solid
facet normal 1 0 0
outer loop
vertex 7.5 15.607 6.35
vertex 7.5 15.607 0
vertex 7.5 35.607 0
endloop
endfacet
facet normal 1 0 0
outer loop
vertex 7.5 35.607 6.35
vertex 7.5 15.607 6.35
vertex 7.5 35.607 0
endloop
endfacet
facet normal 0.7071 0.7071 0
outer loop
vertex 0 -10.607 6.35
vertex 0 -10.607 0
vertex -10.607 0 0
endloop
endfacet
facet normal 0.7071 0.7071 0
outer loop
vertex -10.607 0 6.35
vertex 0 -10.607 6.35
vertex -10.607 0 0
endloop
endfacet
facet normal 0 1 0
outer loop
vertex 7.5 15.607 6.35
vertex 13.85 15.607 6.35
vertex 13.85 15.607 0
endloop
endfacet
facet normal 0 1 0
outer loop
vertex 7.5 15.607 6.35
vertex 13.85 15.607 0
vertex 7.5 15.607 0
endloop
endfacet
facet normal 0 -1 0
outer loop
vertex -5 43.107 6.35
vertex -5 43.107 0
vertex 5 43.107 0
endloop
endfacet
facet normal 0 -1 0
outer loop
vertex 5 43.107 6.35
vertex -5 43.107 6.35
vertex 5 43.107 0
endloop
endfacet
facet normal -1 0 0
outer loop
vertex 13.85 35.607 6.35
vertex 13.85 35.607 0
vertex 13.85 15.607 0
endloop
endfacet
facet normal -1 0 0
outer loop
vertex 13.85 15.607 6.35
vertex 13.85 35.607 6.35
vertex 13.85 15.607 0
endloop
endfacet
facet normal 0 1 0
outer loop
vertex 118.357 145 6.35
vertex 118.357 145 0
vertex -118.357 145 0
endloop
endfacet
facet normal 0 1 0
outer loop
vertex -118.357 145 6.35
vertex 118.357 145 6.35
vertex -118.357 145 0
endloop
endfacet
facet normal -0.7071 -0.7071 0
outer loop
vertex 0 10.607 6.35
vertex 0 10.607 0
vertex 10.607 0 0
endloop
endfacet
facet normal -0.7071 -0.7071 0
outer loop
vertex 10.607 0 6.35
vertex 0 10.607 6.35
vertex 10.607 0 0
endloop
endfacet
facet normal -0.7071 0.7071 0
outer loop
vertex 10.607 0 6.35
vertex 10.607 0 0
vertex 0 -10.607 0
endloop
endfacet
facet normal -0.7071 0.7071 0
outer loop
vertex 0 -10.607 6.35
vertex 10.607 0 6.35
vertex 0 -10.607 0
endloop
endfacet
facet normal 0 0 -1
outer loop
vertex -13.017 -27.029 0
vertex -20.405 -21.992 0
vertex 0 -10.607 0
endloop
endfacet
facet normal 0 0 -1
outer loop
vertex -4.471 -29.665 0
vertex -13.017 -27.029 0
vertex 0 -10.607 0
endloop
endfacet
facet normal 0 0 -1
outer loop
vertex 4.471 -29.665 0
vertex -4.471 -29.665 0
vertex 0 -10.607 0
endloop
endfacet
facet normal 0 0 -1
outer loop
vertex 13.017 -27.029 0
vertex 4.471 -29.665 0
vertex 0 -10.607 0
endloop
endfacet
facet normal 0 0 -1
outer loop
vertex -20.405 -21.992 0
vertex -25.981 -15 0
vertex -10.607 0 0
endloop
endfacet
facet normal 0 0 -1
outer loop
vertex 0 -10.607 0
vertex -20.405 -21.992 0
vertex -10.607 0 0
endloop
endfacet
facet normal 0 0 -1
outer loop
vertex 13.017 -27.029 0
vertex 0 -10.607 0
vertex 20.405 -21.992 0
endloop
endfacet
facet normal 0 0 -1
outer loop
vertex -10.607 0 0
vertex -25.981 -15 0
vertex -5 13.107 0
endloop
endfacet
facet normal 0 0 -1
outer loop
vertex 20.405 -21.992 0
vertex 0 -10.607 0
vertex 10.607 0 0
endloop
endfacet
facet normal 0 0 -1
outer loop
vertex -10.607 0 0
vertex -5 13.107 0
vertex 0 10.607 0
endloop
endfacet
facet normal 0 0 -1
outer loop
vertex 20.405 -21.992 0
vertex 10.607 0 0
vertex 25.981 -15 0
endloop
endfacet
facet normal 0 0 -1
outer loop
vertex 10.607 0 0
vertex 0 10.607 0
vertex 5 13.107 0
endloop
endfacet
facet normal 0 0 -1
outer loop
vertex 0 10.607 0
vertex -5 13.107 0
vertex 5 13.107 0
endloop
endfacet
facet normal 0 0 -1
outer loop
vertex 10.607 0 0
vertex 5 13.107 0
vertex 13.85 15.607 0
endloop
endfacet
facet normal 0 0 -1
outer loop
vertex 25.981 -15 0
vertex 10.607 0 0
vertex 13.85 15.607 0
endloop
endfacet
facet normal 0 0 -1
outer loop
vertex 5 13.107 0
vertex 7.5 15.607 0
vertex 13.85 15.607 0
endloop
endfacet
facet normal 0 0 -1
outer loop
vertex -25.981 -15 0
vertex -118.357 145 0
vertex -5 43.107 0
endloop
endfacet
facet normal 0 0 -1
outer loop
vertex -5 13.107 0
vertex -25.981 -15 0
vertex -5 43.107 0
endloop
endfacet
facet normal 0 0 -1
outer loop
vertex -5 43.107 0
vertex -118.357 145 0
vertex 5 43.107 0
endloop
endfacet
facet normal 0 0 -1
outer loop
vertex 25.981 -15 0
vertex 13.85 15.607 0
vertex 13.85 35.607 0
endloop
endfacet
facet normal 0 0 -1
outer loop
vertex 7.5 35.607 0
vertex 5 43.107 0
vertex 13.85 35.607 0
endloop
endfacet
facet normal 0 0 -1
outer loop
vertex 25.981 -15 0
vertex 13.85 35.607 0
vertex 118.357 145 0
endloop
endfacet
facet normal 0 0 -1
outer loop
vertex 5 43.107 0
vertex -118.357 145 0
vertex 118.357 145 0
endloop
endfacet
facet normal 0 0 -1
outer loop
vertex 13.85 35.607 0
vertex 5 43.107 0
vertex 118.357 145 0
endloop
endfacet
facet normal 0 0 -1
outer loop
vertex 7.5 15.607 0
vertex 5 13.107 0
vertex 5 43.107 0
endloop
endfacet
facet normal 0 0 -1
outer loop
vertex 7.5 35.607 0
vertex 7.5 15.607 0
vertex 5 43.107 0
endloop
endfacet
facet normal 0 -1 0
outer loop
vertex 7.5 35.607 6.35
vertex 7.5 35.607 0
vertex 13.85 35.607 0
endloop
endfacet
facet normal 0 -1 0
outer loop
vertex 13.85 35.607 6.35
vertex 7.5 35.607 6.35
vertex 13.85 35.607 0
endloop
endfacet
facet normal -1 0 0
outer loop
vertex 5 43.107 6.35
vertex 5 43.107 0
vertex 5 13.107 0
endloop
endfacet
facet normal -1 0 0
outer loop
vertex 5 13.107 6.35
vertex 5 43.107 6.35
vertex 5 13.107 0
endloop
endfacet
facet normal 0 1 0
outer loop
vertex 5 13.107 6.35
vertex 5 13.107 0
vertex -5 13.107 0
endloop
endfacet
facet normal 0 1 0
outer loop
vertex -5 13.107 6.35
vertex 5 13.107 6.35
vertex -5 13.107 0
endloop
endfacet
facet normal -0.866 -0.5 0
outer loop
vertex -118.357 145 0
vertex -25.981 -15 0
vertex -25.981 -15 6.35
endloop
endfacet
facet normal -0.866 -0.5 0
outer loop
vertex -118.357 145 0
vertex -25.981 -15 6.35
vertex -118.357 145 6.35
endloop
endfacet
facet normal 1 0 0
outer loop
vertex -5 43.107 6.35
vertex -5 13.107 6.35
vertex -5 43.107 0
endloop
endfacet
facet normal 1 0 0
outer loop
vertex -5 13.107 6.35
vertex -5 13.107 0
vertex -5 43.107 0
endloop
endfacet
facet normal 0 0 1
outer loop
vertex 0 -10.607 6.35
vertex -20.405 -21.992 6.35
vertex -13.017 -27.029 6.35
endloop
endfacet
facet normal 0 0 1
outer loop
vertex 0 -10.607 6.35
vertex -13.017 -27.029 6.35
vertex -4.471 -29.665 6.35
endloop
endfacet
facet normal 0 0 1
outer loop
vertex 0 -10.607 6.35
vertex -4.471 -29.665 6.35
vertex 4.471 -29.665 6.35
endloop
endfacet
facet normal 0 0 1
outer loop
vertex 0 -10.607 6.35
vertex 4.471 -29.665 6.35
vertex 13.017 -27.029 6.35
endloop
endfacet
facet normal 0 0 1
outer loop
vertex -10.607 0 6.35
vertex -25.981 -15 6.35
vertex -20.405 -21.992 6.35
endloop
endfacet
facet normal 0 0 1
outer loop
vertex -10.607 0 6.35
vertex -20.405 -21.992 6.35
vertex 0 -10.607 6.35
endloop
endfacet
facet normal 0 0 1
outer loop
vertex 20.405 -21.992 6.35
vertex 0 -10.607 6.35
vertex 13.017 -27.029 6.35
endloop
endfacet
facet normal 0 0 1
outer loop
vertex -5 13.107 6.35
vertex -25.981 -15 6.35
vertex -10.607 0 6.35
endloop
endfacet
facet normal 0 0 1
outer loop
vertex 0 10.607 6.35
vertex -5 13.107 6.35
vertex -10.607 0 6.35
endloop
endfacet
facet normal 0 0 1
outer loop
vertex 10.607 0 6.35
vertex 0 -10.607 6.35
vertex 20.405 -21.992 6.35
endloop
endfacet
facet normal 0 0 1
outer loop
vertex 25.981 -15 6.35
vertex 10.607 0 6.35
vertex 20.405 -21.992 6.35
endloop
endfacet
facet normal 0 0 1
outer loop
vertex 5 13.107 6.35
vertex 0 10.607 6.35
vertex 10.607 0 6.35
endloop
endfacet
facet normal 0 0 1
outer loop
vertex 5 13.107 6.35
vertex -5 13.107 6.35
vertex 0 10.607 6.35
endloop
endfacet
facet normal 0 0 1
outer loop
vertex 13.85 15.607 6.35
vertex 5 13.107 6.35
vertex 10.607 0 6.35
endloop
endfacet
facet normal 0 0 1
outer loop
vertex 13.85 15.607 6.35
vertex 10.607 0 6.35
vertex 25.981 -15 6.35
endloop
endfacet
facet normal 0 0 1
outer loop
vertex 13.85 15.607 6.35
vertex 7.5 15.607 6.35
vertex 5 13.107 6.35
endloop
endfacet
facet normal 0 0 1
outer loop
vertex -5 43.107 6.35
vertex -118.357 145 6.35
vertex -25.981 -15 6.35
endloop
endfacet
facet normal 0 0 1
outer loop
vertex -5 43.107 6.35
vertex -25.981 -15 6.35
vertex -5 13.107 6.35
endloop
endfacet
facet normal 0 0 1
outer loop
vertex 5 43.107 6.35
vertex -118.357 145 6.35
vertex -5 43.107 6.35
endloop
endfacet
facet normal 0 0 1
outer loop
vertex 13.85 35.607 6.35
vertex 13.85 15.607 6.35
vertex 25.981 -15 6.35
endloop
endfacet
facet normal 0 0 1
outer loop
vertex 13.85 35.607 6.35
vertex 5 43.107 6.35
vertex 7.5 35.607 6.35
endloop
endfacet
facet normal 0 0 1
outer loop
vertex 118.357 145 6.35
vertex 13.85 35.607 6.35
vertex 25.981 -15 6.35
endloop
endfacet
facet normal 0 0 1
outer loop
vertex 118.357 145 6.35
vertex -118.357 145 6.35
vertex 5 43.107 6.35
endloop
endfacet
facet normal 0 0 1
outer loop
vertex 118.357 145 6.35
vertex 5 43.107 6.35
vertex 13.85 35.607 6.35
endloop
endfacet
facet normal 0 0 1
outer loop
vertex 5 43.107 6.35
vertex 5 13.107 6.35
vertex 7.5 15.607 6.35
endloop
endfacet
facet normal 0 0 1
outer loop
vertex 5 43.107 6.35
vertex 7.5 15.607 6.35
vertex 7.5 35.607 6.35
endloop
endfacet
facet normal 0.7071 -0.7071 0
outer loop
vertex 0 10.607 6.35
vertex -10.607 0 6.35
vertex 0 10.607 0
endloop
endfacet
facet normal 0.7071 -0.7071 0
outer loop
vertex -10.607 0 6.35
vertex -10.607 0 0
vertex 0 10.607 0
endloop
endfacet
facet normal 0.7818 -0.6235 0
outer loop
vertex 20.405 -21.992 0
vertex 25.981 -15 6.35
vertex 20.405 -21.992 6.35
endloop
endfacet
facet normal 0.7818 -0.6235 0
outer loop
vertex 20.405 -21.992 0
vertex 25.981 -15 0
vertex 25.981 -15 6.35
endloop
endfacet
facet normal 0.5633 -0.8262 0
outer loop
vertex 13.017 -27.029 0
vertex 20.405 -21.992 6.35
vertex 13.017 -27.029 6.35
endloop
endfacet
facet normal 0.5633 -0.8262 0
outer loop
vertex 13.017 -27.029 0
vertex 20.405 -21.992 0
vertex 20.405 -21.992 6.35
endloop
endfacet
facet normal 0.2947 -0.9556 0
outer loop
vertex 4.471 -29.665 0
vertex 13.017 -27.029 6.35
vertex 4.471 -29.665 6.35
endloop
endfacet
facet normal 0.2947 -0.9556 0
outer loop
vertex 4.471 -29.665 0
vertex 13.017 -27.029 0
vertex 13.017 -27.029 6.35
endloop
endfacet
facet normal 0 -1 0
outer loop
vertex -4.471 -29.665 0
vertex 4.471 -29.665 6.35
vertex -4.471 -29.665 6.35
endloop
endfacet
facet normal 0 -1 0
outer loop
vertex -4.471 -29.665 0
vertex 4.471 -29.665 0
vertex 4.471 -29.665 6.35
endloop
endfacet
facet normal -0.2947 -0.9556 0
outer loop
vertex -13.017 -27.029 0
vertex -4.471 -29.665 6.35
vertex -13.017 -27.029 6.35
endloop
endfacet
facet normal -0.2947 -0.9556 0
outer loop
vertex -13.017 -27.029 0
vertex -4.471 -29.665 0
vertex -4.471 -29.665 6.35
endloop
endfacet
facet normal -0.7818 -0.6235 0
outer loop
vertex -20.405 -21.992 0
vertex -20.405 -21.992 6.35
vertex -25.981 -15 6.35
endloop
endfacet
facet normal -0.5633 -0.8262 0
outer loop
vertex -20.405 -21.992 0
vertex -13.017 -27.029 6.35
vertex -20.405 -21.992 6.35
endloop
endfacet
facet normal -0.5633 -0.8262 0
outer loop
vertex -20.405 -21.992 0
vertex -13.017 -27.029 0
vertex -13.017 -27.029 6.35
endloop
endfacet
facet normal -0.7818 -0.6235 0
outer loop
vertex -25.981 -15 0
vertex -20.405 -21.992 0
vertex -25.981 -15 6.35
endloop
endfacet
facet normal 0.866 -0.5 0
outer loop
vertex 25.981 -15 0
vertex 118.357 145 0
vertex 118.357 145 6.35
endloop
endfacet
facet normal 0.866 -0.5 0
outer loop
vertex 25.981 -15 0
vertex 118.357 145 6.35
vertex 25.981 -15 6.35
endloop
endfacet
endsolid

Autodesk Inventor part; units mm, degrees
ref_plane "YZ Plane" through (0, 0, 0) normal (1, 0, 0) x (0, 1, 0)
ref_plane "XZ Plane" through (0, 0, 0) normal (0, 1, 0) x (-1, 0, 0)
ref_plane "XY Plane" through (0, 0, 0) normal (0, 0, 1) x (1, 0, 0)
sketch "Sketch1" plane through (0, 0, 0) normal (0, 0, 1) x (1, 0, 0)
  line L0 (-10.6066, 0) -> (0, 10.6066)
  line L1 (0, 10.6066) -> (10.6066, 0)
  line L2 (10.6066, 0) -> (0, -10.6066)
  line L3 (0, -10.6066) -> (-10.6066, 0)
  arc A0 (-25.9808, -15) -> (25.9808, -15) centre (0, 0) ccw
  line L4 (118.3568, 145) -> (-118.3568, 145)
  line L5 (7.5, 35.6066) -> (13.85, 35.6066)
  line L6 (13.85, 35.6066) -> (13.85, 15.6066)
  line L7 (13.85, 15.6066) -> (7.5, 15.6066)
  line L8 (7.5, 15.6066) -> (7.5, 35.6066)
  line L9 (-5, 43.1066) -> (5, 43.1066)
  line L10 (5, 43.1066) -> (5, 13.1066)
  line L11 (5, 13.1066) -> (-5, 13.1066)
  line L12 (-5, 13.1066) -> (-5, 43.1066)
  line L13 (118.3568, 145) -> (25.9808, -15)
  line L14 (-25.9808, -15) -> (-118.3568, 145)
  point P0 (0, 13.1066)
  dimension "d0" = 15
  dimension "d4" = 30
  dimension "d6" = 6.35
  dimension "d7" = 20
  dimension "d8" = 5
  dimension "d16" = 10
  dimension "d17" = 2.5
  dimension "d18" = 2.5
  dimension "d19" = 30
  dimension "d23" = 60
  dimension "d24" = 175
extrude "Extrusion1" add sketch "Sketch1" along normal blind 6.35
properties part number "Frame_Lower_Plate_Top"
